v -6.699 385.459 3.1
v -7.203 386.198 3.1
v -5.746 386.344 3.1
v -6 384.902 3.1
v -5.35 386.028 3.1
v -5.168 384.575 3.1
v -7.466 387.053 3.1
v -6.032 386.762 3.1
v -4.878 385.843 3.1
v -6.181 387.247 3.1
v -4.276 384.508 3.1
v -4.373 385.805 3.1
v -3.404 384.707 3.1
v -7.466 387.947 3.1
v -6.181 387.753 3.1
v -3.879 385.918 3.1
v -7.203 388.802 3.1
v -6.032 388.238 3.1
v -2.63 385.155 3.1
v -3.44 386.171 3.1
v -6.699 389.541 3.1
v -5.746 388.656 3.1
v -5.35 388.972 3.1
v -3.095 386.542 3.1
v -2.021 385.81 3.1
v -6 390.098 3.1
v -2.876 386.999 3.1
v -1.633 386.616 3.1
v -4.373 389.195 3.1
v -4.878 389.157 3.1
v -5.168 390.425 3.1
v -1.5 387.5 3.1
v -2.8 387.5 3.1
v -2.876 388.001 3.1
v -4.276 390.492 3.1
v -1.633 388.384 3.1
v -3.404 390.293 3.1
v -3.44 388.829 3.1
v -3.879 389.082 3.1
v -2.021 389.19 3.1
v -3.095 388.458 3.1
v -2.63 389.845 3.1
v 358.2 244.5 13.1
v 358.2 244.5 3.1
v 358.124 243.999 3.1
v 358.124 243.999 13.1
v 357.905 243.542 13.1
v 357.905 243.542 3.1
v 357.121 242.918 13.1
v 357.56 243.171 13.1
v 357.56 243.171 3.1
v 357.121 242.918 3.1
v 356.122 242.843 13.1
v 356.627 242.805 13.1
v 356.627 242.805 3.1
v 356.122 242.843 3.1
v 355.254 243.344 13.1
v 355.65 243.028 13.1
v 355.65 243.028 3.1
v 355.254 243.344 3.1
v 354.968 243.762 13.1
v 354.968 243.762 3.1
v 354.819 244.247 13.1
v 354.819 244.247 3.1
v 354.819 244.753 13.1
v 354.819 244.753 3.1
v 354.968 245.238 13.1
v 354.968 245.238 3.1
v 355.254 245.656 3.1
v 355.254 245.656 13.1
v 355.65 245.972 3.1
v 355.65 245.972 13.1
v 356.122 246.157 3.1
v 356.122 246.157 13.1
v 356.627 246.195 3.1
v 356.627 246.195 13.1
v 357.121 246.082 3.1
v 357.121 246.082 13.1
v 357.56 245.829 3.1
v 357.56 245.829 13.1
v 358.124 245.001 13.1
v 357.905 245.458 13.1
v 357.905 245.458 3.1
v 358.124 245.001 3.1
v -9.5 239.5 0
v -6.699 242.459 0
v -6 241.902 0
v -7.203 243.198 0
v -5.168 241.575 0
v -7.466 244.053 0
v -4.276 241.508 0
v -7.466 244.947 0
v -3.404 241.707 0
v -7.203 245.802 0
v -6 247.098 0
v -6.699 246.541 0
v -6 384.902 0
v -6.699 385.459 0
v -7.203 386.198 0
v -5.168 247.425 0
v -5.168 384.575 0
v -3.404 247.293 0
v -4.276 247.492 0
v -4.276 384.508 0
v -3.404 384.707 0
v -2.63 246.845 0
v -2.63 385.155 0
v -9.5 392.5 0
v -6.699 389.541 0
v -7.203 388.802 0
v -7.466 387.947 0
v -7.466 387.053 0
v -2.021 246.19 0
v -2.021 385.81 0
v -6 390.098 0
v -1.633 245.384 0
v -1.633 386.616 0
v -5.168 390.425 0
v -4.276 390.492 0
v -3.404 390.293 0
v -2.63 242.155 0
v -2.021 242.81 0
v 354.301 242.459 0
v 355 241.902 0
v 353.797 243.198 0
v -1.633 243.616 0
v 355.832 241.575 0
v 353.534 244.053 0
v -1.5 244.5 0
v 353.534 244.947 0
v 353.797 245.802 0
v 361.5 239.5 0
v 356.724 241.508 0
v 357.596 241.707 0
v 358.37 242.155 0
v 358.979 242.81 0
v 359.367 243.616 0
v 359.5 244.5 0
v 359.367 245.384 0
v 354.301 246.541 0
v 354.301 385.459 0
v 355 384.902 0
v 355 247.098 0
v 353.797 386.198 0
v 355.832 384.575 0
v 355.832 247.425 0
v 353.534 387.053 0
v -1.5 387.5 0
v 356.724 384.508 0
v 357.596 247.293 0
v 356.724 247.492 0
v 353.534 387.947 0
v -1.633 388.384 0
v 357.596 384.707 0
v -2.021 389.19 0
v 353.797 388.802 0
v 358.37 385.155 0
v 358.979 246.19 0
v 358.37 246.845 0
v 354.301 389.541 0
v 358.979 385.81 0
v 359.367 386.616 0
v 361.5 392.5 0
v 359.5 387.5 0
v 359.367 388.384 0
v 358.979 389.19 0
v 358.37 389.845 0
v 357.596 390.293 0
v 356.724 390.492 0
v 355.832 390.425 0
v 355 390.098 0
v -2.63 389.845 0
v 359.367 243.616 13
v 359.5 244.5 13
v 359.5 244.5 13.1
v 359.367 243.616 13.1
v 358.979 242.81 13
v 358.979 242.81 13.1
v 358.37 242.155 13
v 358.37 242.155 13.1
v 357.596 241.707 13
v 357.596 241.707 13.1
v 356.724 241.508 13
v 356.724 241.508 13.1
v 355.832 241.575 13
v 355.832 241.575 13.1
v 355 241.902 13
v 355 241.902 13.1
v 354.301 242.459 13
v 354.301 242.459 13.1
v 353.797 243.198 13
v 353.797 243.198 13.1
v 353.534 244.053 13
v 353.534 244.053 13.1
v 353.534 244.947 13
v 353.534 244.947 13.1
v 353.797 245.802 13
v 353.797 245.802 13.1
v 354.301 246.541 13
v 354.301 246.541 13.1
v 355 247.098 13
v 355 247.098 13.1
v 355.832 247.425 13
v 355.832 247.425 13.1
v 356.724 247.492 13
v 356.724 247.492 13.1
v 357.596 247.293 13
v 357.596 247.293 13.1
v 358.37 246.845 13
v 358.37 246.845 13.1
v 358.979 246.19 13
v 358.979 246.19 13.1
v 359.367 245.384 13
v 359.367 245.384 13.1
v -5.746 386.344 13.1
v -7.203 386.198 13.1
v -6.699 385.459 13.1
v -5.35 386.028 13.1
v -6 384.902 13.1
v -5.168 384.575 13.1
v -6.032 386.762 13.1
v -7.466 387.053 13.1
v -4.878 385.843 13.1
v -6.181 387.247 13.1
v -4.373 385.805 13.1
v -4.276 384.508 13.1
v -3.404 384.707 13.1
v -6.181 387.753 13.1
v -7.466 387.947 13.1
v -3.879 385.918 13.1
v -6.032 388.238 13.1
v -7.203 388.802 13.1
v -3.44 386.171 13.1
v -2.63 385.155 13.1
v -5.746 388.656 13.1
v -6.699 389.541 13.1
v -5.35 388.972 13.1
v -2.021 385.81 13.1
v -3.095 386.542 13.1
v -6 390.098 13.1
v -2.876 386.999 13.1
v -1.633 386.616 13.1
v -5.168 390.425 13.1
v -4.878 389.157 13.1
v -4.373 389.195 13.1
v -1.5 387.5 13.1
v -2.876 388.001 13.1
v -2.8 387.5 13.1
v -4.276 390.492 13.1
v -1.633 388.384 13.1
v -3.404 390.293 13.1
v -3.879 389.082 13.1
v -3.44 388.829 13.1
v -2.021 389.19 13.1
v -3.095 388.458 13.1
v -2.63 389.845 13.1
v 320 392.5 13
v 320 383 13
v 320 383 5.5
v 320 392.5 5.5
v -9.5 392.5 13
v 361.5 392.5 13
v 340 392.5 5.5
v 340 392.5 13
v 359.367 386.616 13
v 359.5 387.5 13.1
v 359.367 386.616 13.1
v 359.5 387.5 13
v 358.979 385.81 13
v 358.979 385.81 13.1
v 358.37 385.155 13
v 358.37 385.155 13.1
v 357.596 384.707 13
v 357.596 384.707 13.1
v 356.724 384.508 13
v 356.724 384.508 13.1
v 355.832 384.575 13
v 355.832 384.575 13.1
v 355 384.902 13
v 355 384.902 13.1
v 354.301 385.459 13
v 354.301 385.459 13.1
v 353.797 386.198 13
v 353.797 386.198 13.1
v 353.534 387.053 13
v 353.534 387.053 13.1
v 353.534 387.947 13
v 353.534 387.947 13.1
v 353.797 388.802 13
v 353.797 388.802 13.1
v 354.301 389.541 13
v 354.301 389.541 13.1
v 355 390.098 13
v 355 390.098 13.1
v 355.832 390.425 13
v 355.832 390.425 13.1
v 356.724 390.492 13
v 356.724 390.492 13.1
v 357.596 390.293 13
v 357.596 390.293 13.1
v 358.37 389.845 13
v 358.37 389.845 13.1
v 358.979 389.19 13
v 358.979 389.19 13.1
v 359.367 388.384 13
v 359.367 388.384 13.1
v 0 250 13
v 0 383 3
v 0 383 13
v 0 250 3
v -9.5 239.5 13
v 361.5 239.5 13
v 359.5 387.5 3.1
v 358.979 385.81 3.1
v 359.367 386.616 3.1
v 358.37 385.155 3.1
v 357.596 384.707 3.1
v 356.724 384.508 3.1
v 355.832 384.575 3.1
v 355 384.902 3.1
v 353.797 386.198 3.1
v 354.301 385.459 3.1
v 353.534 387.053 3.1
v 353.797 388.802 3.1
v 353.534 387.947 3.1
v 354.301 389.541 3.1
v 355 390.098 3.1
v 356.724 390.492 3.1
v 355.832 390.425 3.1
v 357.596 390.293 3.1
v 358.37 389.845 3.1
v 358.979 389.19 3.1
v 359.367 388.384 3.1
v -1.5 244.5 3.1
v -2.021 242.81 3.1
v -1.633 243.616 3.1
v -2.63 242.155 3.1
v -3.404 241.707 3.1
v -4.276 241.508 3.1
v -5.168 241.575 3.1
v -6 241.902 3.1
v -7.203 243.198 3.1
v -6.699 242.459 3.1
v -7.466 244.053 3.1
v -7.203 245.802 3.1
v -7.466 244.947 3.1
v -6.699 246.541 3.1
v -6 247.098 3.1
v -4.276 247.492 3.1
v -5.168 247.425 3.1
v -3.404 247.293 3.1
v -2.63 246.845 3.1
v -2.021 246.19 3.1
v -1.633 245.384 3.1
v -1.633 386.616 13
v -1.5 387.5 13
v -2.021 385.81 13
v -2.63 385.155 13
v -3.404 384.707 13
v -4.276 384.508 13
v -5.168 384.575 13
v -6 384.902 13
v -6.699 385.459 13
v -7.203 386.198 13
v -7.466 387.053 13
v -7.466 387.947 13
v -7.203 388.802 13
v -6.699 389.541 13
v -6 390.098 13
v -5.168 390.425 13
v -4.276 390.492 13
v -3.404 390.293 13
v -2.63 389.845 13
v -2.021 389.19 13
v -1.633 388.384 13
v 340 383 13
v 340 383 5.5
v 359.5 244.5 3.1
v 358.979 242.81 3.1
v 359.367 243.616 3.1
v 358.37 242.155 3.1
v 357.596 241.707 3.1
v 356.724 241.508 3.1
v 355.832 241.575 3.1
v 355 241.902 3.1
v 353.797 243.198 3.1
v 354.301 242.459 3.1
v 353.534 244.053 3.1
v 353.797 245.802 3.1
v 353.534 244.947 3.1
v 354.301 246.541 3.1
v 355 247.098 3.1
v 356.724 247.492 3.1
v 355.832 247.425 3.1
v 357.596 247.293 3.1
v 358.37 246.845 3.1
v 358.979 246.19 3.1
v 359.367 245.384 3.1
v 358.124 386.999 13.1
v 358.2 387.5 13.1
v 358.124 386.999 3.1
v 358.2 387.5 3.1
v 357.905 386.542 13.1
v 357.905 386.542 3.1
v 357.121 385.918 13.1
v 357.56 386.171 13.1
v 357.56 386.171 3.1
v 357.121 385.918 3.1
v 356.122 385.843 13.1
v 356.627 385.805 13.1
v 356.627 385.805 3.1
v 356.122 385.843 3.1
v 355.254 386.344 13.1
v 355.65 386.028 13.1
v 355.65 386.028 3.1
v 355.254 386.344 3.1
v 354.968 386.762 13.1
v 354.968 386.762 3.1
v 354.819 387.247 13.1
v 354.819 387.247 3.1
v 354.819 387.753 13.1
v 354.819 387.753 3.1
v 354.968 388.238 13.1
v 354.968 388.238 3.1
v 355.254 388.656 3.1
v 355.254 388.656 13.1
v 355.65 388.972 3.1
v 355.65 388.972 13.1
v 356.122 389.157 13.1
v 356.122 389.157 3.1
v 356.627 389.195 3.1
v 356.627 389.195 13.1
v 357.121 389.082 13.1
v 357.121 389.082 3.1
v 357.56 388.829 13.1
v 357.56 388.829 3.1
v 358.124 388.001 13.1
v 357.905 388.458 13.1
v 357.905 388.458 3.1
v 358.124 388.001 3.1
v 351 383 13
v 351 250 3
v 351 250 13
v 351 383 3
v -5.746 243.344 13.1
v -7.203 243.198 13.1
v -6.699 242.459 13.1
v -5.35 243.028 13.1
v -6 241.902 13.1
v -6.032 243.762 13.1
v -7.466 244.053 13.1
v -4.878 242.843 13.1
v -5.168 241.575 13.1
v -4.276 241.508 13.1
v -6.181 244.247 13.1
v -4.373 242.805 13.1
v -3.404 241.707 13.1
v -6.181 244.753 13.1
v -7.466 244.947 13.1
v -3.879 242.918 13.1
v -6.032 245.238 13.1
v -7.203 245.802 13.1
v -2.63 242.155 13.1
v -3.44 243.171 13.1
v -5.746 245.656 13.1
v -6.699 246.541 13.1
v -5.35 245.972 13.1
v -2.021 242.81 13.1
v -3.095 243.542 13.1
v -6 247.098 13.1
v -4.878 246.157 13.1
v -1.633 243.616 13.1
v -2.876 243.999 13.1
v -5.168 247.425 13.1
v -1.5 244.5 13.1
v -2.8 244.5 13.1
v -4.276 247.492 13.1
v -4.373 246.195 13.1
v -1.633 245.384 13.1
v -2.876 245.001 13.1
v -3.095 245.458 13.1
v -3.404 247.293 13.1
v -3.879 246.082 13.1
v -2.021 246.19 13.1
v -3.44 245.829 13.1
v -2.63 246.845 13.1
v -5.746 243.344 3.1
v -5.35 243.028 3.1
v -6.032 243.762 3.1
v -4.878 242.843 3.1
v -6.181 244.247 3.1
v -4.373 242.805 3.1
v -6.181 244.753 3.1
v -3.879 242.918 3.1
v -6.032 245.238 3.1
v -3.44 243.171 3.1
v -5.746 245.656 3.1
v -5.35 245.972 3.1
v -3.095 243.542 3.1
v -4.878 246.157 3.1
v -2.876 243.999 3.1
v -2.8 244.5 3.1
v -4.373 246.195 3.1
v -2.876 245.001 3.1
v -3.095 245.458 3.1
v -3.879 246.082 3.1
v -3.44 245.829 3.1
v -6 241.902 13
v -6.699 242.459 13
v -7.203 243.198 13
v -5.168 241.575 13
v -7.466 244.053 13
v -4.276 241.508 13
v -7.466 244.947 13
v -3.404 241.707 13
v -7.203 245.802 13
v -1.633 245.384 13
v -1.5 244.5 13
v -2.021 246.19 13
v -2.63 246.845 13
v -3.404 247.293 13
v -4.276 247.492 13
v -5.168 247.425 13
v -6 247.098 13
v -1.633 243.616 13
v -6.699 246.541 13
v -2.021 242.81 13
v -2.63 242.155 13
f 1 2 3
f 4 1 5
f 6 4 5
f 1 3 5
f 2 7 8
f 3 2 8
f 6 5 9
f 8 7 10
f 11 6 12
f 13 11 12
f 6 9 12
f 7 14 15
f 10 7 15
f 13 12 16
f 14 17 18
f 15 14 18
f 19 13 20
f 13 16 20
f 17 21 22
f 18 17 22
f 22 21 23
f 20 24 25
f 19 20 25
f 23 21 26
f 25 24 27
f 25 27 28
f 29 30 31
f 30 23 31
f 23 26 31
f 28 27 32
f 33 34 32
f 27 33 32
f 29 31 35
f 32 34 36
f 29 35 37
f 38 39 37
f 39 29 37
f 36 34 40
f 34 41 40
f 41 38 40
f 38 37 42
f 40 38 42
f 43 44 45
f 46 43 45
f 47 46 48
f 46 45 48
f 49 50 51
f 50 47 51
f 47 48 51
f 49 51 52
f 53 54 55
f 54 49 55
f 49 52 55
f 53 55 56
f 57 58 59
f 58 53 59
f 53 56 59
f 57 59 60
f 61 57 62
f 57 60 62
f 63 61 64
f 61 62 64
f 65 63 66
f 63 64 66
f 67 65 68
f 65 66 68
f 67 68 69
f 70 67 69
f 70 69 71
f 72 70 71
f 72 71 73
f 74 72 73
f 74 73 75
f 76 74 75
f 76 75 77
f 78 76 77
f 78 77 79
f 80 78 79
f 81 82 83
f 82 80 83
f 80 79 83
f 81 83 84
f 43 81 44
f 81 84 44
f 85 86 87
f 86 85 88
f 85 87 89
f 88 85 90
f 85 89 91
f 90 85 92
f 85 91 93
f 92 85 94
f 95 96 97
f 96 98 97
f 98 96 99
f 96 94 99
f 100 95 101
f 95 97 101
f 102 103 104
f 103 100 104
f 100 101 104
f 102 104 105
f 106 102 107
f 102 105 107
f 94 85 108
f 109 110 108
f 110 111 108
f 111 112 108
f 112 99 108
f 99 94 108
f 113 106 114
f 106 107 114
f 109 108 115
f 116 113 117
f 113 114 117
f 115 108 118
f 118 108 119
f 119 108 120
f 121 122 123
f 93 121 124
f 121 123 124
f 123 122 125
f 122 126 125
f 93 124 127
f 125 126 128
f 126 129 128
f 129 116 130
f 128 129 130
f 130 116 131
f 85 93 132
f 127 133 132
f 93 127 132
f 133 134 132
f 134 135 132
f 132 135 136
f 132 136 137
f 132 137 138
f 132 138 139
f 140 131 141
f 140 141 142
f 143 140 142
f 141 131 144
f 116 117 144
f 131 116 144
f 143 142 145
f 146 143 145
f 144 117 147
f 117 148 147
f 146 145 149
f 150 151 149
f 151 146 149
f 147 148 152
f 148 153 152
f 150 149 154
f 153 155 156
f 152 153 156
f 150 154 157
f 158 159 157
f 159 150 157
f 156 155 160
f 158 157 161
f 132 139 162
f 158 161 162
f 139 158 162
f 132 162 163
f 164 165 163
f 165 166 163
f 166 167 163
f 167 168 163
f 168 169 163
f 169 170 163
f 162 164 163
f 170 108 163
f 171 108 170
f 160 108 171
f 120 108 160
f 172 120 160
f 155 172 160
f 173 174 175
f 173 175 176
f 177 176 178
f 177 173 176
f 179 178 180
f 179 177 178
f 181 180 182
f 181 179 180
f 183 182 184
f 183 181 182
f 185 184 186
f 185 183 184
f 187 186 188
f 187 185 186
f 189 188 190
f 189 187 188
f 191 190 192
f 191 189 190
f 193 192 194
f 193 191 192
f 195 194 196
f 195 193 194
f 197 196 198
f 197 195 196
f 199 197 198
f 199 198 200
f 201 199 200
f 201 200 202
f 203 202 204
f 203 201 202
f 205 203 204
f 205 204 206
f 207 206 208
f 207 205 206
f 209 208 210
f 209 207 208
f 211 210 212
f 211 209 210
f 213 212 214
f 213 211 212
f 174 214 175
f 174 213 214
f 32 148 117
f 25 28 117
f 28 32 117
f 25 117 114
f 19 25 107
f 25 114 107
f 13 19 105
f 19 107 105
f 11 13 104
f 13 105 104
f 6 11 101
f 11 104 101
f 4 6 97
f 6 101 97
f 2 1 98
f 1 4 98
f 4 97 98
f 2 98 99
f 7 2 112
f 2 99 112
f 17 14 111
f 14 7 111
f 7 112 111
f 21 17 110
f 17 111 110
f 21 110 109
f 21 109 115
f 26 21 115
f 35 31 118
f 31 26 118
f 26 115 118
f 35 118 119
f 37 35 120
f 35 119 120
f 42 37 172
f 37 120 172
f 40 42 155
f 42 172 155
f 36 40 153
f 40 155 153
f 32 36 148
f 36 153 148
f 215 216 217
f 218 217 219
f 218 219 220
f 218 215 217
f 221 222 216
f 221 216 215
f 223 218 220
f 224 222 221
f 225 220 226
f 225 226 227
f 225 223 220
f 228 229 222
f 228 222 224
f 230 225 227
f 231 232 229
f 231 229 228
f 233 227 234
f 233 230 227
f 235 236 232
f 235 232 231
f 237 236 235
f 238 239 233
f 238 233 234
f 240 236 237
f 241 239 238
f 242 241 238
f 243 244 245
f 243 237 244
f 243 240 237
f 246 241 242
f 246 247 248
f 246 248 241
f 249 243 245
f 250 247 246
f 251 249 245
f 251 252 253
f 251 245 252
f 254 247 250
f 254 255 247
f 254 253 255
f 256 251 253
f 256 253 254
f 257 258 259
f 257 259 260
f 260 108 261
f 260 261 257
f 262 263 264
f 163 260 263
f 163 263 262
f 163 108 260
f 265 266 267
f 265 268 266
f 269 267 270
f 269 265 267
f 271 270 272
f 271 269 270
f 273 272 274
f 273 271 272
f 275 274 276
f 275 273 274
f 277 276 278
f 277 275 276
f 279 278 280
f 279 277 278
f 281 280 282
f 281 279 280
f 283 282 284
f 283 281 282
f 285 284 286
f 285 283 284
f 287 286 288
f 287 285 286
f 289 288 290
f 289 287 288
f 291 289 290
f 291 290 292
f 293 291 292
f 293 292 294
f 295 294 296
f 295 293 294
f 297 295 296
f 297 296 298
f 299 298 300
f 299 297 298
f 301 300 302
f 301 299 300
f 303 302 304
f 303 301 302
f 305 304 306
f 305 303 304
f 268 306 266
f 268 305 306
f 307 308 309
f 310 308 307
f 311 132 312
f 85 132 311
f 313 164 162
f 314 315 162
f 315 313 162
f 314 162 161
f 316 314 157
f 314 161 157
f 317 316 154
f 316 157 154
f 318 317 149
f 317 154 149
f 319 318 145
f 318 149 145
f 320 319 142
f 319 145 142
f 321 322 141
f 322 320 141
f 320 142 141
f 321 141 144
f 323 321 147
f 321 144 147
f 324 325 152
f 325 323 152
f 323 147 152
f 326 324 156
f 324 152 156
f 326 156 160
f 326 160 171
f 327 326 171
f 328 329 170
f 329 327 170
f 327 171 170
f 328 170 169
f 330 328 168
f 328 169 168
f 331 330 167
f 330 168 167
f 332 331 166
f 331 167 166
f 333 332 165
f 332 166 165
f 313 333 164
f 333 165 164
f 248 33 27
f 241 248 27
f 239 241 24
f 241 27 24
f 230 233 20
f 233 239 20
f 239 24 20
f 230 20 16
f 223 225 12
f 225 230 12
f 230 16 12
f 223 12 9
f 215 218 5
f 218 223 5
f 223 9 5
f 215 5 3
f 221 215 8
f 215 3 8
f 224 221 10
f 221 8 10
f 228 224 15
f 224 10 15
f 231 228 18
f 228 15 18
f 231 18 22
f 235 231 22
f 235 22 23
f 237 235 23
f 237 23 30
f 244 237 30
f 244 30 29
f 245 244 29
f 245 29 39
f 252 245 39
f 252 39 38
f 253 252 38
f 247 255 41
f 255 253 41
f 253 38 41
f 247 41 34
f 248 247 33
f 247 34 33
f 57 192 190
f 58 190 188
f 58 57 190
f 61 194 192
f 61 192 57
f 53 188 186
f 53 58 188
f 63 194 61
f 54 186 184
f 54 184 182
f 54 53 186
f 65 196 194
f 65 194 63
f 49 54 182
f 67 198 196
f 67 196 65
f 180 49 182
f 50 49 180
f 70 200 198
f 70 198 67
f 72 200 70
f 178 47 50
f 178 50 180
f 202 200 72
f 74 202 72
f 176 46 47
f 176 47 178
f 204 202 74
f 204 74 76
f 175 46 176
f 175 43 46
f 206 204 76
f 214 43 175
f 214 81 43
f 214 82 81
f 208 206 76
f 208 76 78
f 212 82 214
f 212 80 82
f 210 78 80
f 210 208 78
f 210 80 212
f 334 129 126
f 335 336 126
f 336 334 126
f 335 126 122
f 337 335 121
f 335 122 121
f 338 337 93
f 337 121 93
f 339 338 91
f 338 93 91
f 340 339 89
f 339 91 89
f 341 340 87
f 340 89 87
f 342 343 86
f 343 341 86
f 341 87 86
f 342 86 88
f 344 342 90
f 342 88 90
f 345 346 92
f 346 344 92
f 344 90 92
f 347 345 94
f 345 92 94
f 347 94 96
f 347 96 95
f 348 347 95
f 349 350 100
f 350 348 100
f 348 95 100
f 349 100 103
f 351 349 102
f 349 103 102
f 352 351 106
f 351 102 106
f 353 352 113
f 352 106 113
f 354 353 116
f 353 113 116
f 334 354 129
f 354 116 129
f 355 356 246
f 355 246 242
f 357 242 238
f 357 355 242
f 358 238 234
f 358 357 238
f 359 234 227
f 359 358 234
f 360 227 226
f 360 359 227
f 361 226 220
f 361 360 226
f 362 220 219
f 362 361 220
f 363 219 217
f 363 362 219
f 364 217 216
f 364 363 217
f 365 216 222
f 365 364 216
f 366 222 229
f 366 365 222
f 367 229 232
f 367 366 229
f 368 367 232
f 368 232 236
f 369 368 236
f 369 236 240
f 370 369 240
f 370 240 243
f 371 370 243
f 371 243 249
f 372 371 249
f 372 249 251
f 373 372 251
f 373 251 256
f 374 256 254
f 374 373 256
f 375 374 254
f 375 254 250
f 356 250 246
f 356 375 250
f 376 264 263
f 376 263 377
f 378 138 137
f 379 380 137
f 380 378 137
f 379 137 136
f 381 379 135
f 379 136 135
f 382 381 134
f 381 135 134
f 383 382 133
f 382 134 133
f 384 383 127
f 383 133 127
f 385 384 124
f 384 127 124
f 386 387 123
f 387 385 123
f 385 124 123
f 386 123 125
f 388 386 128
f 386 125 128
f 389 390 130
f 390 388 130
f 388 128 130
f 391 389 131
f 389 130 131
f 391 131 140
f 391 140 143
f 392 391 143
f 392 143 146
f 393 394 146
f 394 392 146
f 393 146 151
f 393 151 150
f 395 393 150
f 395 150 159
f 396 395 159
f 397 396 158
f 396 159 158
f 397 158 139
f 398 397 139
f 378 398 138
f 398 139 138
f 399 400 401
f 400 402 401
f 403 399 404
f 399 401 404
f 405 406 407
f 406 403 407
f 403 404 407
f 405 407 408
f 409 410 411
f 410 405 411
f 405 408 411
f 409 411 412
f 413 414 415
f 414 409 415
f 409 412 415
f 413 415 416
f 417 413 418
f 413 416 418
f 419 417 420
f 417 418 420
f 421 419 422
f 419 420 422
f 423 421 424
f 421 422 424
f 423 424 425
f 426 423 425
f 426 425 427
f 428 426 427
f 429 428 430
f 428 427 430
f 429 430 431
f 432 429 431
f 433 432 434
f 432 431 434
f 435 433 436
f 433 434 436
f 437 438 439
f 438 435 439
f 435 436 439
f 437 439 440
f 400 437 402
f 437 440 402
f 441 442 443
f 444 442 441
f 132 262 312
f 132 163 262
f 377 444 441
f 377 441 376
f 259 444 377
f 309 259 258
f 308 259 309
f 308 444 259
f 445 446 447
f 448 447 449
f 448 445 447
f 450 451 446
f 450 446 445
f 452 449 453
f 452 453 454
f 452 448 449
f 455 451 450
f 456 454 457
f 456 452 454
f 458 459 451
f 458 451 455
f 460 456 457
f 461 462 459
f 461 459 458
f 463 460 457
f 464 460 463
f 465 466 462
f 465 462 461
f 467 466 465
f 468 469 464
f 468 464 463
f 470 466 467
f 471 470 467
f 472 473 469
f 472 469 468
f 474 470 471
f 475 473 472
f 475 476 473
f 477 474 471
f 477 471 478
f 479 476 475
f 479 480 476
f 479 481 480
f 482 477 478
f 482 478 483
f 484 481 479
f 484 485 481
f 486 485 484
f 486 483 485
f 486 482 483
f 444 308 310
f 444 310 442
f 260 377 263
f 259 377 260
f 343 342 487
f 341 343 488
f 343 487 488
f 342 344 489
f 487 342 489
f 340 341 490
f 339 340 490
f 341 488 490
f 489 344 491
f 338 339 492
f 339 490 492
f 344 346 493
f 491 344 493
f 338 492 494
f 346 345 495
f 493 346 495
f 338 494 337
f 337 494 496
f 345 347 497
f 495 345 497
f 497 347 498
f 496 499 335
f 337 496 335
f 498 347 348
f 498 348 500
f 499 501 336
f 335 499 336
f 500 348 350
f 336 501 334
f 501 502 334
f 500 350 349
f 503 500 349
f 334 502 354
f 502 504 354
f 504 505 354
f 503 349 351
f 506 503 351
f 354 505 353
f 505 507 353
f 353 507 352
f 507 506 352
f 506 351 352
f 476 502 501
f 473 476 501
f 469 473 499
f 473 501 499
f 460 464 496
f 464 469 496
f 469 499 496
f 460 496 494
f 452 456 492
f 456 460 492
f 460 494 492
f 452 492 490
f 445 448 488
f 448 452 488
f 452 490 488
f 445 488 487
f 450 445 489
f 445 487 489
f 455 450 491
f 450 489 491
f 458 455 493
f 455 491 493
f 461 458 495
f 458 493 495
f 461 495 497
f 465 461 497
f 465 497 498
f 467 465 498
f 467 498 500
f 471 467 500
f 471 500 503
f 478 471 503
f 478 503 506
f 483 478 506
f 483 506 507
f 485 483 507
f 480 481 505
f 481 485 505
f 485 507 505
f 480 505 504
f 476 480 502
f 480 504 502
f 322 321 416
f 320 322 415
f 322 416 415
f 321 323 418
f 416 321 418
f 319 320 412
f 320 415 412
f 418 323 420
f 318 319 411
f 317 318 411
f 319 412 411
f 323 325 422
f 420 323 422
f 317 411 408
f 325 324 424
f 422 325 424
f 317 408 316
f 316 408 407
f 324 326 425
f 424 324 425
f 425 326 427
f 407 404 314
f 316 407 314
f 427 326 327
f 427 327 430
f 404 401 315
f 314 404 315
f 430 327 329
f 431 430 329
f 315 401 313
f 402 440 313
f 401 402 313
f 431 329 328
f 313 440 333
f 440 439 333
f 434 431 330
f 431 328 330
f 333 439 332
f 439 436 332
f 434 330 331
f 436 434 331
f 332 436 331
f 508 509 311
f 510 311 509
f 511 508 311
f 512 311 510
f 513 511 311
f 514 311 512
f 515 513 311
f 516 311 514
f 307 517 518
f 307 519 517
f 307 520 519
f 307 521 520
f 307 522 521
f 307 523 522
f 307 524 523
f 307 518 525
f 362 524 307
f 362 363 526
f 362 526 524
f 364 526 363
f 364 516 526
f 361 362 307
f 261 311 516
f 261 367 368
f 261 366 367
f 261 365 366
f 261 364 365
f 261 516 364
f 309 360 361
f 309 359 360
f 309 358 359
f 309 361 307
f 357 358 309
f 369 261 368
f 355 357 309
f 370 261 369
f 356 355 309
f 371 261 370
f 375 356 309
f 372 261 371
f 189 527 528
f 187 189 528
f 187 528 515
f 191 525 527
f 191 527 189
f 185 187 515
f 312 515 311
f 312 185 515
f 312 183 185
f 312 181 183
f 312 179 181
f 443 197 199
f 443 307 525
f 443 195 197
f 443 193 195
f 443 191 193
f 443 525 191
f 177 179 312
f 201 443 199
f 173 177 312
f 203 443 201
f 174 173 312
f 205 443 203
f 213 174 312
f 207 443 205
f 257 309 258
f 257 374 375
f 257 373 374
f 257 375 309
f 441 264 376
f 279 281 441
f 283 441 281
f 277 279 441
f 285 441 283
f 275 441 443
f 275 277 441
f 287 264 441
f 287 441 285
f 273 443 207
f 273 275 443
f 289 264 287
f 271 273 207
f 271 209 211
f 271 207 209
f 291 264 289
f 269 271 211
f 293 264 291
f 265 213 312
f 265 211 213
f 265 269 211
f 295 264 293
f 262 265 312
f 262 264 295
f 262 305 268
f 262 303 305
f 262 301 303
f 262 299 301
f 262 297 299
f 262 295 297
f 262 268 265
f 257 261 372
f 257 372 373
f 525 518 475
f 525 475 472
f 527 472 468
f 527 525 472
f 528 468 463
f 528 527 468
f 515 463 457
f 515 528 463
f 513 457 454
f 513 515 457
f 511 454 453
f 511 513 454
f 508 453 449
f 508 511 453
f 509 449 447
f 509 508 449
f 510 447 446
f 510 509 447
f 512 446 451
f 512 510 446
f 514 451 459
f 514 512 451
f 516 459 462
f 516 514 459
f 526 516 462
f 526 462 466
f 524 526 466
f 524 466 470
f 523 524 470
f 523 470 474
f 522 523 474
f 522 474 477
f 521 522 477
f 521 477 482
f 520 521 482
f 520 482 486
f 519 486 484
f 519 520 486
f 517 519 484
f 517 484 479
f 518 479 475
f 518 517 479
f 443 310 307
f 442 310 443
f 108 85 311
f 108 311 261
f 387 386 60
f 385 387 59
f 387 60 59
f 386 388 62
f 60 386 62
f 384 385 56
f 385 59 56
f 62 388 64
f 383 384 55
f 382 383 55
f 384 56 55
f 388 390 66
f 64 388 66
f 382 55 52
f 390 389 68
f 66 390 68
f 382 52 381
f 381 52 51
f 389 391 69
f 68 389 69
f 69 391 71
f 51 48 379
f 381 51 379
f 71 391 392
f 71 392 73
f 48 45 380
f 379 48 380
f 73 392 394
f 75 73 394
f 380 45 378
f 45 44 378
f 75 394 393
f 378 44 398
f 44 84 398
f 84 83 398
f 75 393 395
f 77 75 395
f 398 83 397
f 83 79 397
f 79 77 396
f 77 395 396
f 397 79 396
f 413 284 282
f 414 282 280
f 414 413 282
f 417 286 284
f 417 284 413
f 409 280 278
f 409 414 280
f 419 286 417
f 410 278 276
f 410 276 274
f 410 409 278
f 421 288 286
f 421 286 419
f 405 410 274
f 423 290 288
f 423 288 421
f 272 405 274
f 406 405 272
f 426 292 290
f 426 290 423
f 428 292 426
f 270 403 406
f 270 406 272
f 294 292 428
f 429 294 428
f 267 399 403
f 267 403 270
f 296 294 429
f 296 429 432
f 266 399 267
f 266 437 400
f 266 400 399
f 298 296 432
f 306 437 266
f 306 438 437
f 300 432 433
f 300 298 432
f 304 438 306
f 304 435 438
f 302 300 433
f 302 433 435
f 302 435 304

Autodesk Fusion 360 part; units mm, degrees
sketch "Sketch1" plane through (0, 0, 0) normal (0, 0, 1) x (1, 0, 0)
  line L0 (0, 250) -> (351, 250)
  line L1 (351, 250) -> (351, 383)
  line L2 (351, 383) -> (0, 383)
  line L3 (0, 383) -> (0, 250)
  line L4 (-9.5, 392.5) -> (361.5, 392.5)
  line L5 (361.5, 392.5) -> (361.5, 239.5)
  line L6 (361.5, 239.5) -> (-9.5, 239.5)
  line L7 (-9.5, 239.5) -> (-9.5, 392.5)
  circle A0 centre (-4.5, 244.5) radius 1.7
  circle A1 centre (356.5, 244.5) radius 1.7
  circle A2 centre (-4.5, 387.5) radius 1.7
  circle A3 centre (356.5, 387.5) radius 1.7
  circle A4 centre (-4.5, 387.5) radius 3
  circle A5 centre (356.5, 244.5) radius 3
  circle A6 centre (-4.5, 244.5) radius 3
  circle A7 centre (356.5, 387.5) radius 3
  dimension "d1" = 351
  dimension "d2" = 133
  dimension "d3" = 371
  dimension "d4" = 153
  dimension "d5" = 9.5
  dimension "d10" = 9.5
  dimension "d11" = 3.4
  dimension "d12" = 5
  dimension "d13" = 5
  dimension "d14" = 3.4
  dimension "d15" = 5
  dimension "d16" = 5
  dimension "d17" = 3.4
  dimension "d18" = 5
  dimension "d19" = 5
  dimension "d21" = 5
  dimension "d22" = 5
  dimension "d23" = 6
  dimension "d24" = 6
  dimension "d25" = 6
  dimension "d26" = 6
extrude "Extrude1" add sketch "Sketch1" along normal blind 10 from surface at 3.1 contours A4 | A5 | A6 | A7 makes body 1 at (-1.5928, 245.2403, 9.7667) makes body 2 at (357.3125, 247.3879, 9.7667) makes body 3 at (-7.0599, 389.0643, 9.7667) makes body 4 at (355.1314, 384.8304, 6.4333)
extrude "Extrude2" add sketch "Sketch1" along normal blind 13 contours L4 L5 L6 L7 bodies 1 2 3 4
extrude "Extrude3" add sketch "Sketch1" along normal blind 3 contours L0 L1 L2 L3 bodies 1
sketch "Sketch2" plane through (0, 0, 13) normal (0, 0, 1) x (-1, 0, 0)
  line L0 (0, -250) -> (0, -383)
  line L1 (0, -383) -> (-351, -383)
  line L2 (-351, -383) -> (-351, -250)
  line L3 (-351, -250) -> (0, -250)
  circle A0 centre (-356.5, -244.5) radius 3
  circle A1 centre (4.5, -244.5) radius 3
  circle A2 centre (4.5, -387.5) radius 3
  circle A3 centre (-356.5, -387.5) radius 3
  line L4 (9.5, -239.5) -> (-361.5, -239.5)
  line L5 (-361.5, -239.5) -> (-361.5, -392.5)
  line L6 (-361.5, -392.5) -> (9.5, -392.5)
  line L7 (9.5, -392.5) -> (9.5, -239.5)
sketch "Sketch3" plane through (0, 0, 13) normal (0, 0, 1) x (-1, 0, 0)
  line L0 (2440, -1230) -> (2470, -1230)
  line L1 (2470, -1230) -> (2470, -1260)
  line L2 (2470, -1260) -> (2440, -1260)
  line L3 (2440, -1260) -> (2440, -1230)
sketch "Sketch4" plane through (0, 0, 0) normal (1, 0, 0) x (0, 1, 0)
sketch "Sketch5" plane through (0, 0, 0) normal (0, 0, 1) x (1, 0, 0)
extrude "Extrude4" cut sketch "Sketch3" against normal blind 7.5 bodies 1
sketch "Sketch6" plane through (0, 0, 13) normal (0, 0, 1) x (-1, 0, 0)
  line L0 (-320, -400) -> (-340, -400)
  line L1 (-340, -400) -> (-340, -380)
  line L2 (-340, -380) -> (-320, -380)
  line L3 (-320, -380) -> (-320, -400)
extrude "Extrude5" cut sketch "Sketch6" against normal blind 7.5 bodies 1
